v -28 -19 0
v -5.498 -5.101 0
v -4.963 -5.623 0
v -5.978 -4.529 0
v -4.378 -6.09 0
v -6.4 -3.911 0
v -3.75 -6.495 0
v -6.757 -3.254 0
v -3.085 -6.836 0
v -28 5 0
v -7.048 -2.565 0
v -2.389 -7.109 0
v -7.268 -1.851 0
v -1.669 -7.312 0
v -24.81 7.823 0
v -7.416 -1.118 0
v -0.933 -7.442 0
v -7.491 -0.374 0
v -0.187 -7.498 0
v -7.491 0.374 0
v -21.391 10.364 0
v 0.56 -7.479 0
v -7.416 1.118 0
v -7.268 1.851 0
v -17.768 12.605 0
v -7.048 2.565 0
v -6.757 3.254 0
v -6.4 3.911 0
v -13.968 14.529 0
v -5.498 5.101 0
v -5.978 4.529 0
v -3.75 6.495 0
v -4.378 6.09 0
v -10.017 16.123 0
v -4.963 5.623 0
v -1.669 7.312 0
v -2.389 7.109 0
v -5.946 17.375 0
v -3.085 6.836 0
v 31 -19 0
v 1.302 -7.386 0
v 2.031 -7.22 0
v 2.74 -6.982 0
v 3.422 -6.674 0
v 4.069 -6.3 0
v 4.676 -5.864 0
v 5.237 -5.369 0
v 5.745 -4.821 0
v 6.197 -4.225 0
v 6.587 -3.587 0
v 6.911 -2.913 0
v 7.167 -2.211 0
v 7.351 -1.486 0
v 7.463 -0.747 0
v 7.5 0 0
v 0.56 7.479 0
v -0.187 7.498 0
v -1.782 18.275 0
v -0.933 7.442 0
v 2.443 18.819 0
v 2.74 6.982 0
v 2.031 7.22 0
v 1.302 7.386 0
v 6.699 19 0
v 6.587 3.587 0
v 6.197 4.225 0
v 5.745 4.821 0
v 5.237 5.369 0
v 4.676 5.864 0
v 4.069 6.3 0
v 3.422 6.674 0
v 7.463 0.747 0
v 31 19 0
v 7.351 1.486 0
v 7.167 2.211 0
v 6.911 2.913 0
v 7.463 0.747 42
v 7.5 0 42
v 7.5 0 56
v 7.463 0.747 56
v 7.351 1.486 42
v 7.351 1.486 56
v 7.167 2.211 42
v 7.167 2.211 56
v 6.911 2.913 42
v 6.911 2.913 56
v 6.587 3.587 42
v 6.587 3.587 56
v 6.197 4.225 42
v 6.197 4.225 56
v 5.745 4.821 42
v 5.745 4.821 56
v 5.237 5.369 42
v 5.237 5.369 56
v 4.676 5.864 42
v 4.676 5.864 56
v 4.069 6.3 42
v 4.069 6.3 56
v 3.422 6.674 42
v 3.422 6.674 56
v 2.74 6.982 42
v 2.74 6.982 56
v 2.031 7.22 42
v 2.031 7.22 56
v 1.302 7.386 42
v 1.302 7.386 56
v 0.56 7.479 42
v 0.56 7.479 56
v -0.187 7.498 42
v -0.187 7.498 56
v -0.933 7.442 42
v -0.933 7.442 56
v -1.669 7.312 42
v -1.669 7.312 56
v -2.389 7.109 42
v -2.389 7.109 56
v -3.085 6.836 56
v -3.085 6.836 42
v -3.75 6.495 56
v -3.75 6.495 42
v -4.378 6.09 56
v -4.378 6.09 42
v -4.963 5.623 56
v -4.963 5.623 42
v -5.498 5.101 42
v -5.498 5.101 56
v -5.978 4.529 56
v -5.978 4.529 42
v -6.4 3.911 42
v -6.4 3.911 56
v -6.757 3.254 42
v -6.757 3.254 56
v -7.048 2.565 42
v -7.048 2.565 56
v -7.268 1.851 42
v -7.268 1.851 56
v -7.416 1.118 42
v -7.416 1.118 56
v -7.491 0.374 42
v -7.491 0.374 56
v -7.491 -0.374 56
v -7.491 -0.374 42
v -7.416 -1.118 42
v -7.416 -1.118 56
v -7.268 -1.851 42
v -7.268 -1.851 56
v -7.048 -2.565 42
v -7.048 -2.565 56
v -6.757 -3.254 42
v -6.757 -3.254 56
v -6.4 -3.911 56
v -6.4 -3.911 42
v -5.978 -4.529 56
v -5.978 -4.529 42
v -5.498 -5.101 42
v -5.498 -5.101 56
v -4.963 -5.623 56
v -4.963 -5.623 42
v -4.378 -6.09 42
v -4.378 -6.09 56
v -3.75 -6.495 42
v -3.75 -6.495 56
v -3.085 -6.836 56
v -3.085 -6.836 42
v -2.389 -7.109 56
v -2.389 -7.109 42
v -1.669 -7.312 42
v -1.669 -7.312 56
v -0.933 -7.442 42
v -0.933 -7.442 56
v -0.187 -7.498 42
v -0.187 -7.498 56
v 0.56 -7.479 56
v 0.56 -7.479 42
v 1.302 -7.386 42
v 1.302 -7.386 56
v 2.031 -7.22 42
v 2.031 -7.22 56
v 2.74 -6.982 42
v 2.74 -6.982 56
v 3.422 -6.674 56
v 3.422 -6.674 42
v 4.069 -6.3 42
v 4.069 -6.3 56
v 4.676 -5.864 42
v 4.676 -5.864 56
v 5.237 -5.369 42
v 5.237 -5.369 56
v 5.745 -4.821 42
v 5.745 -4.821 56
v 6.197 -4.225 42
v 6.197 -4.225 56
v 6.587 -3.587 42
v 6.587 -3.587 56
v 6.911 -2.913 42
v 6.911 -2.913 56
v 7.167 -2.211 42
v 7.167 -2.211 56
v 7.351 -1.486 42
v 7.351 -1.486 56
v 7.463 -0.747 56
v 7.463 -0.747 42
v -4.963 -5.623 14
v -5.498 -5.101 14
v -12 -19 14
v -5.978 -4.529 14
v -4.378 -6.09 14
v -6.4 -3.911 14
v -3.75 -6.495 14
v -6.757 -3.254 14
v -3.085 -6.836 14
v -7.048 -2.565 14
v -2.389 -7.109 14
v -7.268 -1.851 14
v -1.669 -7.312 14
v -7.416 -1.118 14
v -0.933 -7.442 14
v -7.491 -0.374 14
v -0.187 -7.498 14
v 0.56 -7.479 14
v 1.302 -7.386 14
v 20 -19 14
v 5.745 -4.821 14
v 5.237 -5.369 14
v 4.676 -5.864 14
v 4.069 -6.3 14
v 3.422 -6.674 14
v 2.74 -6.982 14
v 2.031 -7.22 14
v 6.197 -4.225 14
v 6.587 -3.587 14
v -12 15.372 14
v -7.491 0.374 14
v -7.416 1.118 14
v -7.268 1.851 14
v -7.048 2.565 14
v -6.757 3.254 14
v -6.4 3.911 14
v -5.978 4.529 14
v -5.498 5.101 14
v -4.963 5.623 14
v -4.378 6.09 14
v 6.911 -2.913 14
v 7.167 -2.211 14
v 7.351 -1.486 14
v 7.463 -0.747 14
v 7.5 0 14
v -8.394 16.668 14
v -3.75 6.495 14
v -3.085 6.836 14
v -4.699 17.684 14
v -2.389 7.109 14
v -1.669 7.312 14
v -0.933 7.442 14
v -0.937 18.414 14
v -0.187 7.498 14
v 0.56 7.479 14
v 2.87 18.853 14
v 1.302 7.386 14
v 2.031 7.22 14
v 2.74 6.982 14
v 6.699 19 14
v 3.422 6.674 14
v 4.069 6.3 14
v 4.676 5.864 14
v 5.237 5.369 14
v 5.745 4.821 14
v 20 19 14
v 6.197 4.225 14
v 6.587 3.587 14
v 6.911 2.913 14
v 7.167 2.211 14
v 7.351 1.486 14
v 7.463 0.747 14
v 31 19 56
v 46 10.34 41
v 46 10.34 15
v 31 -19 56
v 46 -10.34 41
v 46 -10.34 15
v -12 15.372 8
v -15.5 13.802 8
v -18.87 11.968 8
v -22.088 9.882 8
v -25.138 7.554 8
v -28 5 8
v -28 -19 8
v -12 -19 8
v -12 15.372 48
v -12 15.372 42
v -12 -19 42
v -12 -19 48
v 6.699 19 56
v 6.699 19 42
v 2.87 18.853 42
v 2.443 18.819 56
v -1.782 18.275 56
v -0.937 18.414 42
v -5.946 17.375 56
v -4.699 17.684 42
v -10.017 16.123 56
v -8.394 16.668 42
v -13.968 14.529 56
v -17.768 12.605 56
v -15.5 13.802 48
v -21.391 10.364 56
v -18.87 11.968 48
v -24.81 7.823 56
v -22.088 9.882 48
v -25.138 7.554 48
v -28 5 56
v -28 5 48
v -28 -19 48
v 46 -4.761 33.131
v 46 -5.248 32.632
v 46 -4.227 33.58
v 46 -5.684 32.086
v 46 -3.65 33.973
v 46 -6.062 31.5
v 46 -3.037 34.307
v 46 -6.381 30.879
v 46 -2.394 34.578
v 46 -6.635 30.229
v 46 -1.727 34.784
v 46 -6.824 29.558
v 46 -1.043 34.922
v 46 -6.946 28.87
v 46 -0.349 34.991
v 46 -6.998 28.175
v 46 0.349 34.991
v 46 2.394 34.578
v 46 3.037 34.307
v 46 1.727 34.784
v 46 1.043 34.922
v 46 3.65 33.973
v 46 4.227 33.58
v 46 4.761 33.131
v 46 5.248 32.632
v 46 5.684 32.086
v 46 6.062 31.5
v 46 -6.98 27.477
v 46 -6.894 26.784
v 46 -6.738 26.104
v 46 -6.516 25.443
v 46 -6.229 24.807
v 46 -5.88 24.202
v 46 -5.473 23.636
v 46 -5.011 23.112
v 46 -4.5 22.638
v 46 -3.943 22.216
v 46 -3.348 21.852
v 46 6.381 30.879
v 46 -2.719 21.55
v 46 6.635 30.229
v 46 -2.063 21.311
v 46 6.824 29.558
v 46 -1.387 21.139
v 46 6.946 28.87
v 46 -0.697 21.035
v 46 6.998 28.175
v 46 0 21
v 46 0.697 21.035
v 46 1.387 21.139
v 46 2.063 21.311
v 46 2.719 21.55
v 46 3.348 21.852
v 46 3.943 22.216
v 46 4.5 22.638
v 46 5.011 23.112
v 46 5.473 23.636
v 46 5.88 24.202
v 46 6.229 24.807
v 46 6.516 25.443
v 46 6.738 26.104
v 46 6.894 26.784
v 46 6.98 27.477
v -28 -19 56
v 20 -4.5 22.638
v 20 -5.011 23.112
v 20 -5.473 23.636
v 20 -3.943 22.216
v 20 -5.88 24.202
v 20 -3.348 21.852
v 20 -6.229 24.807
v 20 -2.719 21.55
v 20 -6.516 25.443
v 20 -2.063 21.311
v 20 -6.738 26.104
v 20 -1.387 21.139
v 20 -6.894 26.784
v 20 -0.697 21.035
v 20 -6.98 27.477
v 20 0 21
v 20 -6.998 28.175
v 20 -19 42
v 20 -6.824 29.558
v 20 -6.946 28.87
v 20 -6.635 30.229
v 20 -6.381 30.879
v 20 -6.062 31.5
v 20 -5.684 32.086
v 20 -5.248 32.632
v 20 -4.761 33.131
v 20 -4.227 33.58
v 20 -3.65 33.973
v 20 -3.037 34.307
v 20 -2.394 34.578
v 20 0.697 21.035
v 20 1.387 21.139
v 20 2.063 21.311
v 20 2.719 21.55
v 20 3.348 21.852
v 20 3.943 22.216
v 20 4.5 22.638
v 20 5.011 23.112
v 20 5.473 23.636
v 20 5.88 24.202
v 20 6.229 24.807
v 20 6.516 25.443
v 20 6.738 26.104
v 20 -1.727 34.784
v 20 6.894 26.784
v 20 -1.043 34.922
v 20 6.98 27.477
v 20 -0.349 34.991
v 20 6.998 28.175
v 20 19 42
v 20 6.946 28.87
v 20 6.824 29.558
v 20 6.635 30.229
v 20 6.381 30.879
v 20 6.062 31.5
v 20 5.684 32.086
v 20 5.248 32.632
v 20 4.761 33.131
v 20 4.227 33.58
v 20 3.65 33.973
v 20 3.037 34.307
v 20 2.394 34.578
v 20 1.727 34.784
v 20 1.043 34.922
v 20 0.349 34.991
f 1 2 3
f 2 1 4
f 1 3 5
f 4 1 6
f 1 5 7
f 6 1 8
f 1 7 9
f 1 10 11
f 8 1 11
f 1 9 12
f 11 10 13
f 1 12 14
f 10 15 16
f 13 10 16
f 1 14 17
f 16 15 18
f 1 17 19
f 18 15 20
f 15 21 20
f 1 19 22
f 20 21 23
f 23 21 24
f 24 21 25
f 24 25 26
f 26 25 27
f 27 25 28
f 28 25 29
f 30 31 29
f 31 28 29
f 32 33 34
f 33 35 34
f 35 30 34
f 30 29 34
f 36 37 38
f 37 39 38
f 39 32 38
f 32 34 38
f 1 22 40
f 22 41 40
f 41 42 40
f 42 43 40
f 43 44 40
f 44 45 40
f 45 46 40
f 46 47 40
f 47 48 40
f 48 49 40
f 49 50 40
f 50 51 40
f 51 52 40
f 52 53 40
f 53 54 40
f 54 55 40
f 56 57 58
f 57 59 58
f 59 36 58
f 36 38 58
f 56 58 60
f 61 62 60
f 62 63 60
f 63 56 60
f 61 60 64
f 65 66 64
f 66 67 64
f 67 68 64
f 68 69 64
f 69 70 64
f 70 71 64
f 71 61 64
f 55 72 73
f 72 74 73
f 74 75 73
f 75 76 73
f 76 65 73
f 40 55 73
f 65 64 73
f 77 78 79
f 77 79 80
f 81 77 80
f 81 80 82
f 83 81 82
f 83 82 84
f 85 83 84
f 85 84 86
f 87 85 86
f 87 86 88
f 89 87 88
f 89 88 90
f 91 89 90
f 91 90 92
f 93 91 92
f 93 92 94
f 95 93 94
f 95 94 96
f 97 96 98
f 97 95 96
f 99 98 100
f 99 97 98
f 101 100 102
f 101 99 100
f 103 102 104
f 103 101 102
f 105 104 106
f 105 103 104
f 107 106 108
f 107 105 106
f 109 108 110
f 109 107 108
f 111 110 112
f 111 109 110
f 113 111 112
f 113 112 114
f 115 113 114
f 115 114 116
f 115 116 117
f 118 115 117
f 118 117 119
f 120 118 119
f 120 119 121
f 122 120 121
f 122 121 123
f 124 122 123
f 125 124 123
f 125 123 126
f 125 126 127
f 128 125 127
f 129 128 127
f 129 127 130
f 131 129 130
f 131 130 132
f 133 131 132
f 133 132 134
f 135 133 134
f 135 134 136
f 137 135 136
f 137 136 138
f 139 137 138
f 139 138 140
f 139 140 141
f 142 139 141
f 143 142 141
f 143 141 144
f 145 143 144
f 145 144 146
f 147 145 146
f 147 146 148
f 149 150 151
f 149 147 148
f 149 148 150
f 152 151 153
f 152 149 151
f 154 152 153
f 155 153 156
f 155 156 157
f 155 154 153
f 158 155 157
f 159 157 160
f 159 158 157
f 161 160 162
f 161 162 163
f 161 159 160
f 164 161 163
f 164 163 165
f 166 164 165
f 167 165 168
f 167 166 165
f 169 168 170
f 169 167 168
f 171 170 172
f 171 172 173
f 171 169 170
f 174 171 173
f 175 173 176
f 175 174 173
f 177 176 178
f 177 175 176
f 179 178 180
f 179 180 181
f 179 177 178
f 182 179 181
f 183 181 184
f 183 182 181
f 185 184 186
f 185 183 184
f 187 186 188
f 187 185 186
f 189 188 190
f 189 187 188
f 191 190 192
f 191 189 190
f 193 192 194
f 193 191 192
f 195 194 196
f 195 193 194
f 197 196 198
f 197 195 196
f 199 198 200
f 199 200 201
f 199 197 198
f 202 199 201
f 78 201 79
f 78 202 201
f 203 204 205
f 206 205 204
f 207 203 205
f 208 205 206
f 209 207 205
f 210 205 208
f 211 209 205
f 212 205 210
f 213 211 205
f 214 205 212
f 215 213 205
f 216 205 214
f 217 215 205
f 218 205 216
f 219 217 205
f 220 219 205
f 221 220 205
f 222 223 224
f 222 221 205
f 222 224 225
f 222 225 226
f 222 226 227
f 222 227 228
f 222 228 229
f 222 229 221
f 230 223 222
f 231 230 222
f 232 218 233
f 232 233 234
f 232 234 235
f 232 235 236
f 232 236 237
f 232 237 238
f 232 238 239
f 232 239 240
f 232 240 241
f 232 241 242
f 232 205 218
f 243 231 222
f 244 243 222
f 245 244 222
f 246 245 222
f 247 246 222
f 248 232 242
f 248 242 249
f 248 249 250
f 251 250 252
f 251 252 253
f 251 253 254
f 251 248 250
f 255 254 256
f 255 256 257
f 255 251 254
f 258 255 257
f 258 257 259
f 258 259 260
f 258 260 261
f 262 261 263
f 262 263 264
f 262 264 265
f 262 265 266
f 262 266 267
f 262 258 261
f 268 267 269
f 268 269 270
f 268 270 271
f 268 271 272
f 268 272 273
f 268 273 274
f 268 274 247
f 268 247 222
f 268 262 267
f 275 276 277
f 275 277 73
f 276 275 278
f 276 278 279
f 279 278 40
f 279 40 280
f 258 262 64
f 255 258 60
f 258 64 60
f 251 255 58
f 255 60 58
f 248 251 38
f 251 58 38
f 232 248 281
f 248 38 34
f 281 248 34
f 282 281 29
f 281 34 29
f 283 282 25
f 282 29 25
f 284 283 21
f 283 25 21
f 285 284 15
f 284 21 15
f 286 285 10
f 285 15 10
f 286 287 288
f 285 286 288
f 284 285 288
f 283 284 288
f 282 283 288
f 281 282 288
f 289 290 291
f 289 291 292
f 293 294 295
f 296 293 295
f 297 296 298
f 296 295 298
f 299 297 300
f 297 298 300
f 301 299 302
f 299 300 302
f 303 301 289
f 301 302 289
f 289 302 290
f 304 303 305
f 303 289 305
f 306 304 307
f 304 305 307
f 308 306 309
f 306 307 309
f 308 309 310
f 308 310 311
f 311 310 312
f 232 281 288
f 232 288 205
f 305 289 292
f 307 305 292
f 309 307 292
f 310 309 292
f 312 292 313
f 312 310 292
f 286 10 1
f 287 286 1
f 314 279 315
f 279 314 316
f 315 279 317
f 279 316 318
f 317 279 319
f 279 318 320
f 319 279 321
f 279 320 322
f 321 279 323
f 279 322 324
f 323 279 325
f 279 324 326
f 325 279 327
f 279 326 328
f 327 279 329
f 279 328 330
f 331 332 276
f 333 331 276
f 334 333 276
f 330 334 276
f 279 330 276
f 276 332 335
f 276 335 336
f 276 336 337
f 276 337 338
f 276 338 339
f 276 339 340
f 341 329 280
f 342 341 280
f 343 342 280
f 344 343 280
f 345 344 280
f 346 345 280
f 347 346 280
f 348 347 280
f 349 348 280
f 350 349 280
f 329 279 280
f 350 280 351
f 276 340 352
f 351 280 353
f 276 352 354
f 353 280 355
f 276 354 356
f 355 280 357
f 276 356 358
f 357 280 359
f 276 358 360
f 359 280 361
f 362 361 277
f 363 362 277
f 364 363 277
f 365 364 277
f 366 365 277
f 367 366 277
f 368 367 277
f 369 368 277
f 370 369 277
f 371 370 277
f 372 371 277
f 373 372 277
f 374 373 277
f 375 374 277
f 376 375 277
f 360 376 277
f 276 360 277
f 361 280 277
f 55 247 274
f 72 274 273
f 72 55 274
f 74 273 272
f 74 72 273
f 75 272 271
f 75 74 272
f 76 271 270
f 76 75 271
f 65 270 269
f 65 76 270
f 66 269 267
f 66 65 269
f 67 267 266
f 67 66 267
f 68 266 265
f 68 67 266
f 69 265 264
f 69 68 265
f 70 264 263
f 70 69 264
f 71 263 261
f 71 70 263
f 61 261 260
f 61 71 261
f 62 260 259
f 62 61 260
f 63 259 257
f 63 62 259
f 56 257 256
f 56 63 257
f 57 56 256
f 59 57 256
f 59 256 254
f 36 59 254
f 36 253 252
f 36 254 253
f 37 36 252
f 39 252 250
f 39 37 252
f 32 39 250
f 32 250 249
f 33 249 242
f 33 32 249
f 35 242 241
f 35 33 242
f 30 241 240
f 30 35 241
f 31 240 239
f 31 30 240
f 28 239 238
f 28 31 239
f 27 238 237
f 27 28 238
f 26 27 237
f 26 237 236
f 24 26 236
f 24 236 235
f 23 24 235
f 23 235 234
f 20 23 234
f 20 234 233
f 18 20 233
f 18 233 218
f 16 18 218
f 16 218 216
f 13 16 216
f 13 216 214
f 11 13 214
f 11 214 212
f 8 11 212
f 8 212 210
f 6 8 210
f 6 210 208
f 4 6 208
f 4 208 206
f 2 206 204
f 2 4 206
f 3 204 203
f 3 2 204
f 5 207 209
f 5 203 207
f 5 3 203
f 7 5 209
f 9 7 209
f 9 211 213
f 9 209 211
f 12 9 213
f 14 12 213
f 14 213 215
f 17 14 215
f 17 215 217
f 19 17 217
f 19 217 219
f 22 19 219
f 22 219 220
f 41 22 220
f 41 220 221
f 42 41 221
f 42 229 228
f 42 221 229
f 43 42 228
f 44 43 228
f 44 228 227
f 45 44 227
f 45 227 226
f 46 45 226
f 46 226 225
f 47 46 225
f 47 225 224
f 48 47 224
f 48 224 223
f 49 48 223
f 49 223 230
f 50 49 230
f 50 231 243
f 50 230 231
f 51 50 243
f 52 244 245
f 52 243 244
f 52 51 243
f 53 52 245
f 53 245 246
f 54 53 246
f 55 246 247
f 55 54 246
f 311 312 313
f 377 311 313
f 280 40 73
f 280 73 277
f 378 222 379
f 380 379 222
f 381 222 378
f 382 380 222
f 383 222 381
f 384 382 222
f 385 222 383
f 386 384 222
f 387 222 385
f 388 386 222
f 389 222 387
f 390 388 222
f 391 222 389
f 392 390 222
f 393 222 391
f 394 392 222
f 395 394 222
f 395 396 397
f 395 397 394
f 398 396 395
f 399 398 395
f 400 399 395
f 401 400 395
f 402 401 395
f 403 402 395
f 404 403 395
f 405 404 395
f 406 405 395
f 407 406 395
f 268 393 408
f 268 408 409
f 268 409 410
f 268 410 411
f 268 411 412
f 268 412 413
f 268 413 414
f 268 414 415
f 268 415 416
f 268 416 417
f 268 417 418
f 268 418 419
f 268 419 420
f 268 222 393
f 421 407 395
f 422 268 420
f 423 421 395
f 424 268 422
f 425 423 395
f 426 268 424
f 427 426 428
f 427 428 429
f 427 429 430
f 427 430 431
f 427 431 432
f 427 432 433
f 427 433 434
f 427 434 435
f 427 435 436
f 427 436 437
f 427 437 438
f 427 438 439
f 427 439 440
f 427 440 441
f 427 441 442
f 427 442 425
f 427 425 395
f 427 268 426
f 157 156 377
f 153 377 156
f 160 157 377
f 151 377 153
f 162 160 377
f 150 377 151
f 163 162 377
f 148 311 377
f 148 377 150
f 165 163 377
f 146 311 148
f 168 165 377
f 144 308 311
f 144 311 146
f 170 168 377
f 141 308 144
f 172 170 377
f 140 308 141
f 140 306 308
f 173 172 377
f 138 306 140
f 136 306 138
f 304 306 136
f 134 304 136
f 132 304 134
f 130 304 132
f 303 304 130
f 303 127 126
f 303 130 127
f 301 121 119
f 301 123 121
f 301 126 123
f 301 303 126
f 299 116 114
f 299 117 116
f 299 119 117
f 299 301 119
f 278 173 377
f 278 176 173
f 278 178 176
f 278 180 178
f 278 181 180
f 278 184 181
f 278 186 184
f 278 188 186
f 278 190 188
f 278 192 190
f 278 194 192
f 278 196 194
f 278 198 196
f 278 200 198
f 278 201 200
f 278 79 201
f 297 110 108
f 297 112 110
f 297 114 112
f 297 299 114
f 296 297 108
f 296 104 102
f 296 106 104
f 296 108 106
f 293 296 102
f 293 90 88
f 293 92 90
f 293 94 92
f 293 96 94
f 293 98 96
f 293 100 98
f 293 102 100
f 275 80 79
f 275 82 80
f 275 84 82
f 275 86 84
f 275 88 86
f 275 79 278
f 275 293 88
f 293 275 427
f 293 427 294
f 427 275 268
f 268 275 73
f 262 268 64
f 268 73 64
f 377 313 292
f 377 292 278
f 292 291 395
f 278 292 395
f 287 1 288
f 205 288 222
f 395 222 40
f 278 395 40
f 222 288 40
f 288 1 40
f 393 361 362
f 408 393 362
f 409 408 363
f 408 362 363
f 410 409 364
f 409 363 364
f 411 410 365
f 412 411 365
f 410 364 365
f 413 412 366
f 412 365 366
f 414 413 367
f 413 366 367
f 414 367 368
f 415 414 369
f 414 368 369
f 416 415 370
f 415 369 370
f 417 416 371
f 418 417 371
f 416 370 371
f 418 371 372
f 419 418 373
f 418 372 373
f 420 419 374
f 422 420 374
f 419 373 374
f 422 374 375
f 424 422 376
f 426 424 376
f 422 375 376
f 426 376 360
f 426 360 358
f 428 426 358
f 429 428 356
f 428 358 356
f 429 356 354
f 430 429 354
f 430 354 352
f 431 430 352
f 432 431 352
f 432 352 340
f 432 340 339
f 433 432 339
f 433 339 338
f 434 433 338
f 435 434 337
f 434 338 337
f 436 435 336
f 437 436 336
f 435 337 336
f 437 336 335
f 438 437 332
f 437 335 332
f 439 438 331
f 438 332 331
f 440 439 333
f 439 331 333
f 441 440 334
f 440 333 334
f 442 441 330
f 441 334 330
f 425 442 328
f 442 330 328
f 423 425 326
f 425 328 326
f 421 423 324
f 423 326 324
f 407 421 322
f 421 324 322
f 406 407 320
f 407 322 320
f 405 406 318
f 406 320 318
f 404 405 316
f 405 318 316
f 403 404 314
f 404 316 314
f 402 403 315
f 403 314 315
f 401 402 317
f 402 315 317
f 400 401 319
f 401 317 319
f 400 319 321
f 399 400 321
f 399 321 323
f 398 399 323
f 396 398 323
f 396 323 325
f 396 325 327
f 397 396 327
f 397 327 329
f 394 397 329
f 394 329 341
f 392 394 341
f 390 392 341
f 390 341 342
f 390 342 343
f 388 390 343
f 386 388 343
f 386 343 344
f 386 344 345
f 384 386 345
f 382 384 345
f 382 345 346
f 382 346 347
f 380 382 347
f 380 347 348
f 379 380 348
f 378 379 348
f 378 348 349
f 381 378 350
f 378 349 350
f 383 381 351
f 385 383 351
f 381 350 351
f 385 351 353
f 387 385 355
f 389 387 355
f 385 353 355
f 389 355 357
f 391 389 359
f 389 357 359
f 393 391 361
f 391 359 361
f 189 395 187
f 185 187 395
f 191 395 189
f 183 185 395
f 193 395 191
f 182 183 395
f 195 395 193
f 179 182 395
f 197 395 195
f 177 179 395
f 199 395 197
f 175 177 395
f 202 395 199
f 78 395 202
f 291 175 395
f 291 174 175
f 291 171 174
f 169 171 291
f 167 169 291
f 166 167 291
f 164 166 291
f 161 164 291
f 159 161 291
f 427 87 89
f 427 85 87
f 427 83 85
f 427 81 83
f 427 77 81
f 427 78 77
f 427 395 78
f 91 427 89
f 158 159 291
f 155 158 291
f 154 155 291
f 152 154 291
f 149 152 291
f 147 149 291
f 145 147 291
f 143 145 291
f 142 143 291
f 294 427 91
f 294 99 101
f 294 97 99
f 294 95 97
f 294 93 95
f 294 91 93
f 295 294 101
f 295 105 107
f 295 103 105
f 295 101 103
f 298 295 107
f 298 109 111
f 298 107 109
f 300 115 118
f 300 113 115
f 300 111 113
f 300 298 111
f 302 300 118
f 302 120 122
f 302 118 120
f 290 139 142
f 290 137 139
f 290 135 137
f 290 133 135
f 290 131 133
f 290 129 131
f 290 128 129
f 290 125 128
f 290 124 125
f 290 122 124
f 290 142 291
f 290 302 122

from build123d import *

# Parameters (mm, degrees)
SKETCH1_R           = 7.5
BOSS_EXTRUDE1_DEPTH = 56
CUT_EXTRUDE1_DEPTH  = 38
SKETCH3_R           = 7
CUT_EXTRUDE2_DEPTH  = 26


with BuildPart() as part:
    # Sketch1 → Boss-Extrude1 (new body)
    with BuildSketch(Plane.XY):
        with BuildLine():
            Line((-28, -19), (31, -19))
            Line((31, -19), (46, -10.339745962))
            Line((46, -10.339745962), (46, 10.339745962))
            Line((46, 10.339745962), (31, 19))
            Line((31, 19), (6.698703146, 19))
            ThreePointArc((6.698703146, 19), (-12.009583788, 15.368092477), (-28, 5))
            Line((-28, 5), (-28, -19))
        make_face()
        Circle(SKETCH1_R, mode=Mode.SUBTRACT)
    extrude(amount=BOSS_EXTRUDE1_DEPTH)

    # Sketch2 → Cut-Extrude1 (cut)
    with BuildSketch(Plane(origin=(0, 19, 0), x_dir=(1, 0, 0), z_dir=(0, 1, 0))):
        Polygon((31, 0), (46, -15), (46, 0), align=None)
        Polygon((31, -56), (46, -41), (46, -56), align=None)
        Polygon((-28, -8), (-12, -8), (-12, -14), (20, -14), (20, -42), (-12, -42), (-12, -48), (-28, -48), align=None)
    extrude(amount=-CUT_EXTRUDE1_DEPTH, mode=Mode.SUBTRACT)

    # Sketch3 → Cut-Extrude2 (cut)
    with BuildSketch(Plane(origin=(46, 0, 0), x_dir=(0, 0, -1), z_dir=(1, 0, 0))):
        with Locations((-28, 0)):
            Circle(SKETCH3_R)
    extrude(amount=-CUT_EXTRUDE2_DEPTH, mode=Mode.SUBTRACT)


solid = part.part
